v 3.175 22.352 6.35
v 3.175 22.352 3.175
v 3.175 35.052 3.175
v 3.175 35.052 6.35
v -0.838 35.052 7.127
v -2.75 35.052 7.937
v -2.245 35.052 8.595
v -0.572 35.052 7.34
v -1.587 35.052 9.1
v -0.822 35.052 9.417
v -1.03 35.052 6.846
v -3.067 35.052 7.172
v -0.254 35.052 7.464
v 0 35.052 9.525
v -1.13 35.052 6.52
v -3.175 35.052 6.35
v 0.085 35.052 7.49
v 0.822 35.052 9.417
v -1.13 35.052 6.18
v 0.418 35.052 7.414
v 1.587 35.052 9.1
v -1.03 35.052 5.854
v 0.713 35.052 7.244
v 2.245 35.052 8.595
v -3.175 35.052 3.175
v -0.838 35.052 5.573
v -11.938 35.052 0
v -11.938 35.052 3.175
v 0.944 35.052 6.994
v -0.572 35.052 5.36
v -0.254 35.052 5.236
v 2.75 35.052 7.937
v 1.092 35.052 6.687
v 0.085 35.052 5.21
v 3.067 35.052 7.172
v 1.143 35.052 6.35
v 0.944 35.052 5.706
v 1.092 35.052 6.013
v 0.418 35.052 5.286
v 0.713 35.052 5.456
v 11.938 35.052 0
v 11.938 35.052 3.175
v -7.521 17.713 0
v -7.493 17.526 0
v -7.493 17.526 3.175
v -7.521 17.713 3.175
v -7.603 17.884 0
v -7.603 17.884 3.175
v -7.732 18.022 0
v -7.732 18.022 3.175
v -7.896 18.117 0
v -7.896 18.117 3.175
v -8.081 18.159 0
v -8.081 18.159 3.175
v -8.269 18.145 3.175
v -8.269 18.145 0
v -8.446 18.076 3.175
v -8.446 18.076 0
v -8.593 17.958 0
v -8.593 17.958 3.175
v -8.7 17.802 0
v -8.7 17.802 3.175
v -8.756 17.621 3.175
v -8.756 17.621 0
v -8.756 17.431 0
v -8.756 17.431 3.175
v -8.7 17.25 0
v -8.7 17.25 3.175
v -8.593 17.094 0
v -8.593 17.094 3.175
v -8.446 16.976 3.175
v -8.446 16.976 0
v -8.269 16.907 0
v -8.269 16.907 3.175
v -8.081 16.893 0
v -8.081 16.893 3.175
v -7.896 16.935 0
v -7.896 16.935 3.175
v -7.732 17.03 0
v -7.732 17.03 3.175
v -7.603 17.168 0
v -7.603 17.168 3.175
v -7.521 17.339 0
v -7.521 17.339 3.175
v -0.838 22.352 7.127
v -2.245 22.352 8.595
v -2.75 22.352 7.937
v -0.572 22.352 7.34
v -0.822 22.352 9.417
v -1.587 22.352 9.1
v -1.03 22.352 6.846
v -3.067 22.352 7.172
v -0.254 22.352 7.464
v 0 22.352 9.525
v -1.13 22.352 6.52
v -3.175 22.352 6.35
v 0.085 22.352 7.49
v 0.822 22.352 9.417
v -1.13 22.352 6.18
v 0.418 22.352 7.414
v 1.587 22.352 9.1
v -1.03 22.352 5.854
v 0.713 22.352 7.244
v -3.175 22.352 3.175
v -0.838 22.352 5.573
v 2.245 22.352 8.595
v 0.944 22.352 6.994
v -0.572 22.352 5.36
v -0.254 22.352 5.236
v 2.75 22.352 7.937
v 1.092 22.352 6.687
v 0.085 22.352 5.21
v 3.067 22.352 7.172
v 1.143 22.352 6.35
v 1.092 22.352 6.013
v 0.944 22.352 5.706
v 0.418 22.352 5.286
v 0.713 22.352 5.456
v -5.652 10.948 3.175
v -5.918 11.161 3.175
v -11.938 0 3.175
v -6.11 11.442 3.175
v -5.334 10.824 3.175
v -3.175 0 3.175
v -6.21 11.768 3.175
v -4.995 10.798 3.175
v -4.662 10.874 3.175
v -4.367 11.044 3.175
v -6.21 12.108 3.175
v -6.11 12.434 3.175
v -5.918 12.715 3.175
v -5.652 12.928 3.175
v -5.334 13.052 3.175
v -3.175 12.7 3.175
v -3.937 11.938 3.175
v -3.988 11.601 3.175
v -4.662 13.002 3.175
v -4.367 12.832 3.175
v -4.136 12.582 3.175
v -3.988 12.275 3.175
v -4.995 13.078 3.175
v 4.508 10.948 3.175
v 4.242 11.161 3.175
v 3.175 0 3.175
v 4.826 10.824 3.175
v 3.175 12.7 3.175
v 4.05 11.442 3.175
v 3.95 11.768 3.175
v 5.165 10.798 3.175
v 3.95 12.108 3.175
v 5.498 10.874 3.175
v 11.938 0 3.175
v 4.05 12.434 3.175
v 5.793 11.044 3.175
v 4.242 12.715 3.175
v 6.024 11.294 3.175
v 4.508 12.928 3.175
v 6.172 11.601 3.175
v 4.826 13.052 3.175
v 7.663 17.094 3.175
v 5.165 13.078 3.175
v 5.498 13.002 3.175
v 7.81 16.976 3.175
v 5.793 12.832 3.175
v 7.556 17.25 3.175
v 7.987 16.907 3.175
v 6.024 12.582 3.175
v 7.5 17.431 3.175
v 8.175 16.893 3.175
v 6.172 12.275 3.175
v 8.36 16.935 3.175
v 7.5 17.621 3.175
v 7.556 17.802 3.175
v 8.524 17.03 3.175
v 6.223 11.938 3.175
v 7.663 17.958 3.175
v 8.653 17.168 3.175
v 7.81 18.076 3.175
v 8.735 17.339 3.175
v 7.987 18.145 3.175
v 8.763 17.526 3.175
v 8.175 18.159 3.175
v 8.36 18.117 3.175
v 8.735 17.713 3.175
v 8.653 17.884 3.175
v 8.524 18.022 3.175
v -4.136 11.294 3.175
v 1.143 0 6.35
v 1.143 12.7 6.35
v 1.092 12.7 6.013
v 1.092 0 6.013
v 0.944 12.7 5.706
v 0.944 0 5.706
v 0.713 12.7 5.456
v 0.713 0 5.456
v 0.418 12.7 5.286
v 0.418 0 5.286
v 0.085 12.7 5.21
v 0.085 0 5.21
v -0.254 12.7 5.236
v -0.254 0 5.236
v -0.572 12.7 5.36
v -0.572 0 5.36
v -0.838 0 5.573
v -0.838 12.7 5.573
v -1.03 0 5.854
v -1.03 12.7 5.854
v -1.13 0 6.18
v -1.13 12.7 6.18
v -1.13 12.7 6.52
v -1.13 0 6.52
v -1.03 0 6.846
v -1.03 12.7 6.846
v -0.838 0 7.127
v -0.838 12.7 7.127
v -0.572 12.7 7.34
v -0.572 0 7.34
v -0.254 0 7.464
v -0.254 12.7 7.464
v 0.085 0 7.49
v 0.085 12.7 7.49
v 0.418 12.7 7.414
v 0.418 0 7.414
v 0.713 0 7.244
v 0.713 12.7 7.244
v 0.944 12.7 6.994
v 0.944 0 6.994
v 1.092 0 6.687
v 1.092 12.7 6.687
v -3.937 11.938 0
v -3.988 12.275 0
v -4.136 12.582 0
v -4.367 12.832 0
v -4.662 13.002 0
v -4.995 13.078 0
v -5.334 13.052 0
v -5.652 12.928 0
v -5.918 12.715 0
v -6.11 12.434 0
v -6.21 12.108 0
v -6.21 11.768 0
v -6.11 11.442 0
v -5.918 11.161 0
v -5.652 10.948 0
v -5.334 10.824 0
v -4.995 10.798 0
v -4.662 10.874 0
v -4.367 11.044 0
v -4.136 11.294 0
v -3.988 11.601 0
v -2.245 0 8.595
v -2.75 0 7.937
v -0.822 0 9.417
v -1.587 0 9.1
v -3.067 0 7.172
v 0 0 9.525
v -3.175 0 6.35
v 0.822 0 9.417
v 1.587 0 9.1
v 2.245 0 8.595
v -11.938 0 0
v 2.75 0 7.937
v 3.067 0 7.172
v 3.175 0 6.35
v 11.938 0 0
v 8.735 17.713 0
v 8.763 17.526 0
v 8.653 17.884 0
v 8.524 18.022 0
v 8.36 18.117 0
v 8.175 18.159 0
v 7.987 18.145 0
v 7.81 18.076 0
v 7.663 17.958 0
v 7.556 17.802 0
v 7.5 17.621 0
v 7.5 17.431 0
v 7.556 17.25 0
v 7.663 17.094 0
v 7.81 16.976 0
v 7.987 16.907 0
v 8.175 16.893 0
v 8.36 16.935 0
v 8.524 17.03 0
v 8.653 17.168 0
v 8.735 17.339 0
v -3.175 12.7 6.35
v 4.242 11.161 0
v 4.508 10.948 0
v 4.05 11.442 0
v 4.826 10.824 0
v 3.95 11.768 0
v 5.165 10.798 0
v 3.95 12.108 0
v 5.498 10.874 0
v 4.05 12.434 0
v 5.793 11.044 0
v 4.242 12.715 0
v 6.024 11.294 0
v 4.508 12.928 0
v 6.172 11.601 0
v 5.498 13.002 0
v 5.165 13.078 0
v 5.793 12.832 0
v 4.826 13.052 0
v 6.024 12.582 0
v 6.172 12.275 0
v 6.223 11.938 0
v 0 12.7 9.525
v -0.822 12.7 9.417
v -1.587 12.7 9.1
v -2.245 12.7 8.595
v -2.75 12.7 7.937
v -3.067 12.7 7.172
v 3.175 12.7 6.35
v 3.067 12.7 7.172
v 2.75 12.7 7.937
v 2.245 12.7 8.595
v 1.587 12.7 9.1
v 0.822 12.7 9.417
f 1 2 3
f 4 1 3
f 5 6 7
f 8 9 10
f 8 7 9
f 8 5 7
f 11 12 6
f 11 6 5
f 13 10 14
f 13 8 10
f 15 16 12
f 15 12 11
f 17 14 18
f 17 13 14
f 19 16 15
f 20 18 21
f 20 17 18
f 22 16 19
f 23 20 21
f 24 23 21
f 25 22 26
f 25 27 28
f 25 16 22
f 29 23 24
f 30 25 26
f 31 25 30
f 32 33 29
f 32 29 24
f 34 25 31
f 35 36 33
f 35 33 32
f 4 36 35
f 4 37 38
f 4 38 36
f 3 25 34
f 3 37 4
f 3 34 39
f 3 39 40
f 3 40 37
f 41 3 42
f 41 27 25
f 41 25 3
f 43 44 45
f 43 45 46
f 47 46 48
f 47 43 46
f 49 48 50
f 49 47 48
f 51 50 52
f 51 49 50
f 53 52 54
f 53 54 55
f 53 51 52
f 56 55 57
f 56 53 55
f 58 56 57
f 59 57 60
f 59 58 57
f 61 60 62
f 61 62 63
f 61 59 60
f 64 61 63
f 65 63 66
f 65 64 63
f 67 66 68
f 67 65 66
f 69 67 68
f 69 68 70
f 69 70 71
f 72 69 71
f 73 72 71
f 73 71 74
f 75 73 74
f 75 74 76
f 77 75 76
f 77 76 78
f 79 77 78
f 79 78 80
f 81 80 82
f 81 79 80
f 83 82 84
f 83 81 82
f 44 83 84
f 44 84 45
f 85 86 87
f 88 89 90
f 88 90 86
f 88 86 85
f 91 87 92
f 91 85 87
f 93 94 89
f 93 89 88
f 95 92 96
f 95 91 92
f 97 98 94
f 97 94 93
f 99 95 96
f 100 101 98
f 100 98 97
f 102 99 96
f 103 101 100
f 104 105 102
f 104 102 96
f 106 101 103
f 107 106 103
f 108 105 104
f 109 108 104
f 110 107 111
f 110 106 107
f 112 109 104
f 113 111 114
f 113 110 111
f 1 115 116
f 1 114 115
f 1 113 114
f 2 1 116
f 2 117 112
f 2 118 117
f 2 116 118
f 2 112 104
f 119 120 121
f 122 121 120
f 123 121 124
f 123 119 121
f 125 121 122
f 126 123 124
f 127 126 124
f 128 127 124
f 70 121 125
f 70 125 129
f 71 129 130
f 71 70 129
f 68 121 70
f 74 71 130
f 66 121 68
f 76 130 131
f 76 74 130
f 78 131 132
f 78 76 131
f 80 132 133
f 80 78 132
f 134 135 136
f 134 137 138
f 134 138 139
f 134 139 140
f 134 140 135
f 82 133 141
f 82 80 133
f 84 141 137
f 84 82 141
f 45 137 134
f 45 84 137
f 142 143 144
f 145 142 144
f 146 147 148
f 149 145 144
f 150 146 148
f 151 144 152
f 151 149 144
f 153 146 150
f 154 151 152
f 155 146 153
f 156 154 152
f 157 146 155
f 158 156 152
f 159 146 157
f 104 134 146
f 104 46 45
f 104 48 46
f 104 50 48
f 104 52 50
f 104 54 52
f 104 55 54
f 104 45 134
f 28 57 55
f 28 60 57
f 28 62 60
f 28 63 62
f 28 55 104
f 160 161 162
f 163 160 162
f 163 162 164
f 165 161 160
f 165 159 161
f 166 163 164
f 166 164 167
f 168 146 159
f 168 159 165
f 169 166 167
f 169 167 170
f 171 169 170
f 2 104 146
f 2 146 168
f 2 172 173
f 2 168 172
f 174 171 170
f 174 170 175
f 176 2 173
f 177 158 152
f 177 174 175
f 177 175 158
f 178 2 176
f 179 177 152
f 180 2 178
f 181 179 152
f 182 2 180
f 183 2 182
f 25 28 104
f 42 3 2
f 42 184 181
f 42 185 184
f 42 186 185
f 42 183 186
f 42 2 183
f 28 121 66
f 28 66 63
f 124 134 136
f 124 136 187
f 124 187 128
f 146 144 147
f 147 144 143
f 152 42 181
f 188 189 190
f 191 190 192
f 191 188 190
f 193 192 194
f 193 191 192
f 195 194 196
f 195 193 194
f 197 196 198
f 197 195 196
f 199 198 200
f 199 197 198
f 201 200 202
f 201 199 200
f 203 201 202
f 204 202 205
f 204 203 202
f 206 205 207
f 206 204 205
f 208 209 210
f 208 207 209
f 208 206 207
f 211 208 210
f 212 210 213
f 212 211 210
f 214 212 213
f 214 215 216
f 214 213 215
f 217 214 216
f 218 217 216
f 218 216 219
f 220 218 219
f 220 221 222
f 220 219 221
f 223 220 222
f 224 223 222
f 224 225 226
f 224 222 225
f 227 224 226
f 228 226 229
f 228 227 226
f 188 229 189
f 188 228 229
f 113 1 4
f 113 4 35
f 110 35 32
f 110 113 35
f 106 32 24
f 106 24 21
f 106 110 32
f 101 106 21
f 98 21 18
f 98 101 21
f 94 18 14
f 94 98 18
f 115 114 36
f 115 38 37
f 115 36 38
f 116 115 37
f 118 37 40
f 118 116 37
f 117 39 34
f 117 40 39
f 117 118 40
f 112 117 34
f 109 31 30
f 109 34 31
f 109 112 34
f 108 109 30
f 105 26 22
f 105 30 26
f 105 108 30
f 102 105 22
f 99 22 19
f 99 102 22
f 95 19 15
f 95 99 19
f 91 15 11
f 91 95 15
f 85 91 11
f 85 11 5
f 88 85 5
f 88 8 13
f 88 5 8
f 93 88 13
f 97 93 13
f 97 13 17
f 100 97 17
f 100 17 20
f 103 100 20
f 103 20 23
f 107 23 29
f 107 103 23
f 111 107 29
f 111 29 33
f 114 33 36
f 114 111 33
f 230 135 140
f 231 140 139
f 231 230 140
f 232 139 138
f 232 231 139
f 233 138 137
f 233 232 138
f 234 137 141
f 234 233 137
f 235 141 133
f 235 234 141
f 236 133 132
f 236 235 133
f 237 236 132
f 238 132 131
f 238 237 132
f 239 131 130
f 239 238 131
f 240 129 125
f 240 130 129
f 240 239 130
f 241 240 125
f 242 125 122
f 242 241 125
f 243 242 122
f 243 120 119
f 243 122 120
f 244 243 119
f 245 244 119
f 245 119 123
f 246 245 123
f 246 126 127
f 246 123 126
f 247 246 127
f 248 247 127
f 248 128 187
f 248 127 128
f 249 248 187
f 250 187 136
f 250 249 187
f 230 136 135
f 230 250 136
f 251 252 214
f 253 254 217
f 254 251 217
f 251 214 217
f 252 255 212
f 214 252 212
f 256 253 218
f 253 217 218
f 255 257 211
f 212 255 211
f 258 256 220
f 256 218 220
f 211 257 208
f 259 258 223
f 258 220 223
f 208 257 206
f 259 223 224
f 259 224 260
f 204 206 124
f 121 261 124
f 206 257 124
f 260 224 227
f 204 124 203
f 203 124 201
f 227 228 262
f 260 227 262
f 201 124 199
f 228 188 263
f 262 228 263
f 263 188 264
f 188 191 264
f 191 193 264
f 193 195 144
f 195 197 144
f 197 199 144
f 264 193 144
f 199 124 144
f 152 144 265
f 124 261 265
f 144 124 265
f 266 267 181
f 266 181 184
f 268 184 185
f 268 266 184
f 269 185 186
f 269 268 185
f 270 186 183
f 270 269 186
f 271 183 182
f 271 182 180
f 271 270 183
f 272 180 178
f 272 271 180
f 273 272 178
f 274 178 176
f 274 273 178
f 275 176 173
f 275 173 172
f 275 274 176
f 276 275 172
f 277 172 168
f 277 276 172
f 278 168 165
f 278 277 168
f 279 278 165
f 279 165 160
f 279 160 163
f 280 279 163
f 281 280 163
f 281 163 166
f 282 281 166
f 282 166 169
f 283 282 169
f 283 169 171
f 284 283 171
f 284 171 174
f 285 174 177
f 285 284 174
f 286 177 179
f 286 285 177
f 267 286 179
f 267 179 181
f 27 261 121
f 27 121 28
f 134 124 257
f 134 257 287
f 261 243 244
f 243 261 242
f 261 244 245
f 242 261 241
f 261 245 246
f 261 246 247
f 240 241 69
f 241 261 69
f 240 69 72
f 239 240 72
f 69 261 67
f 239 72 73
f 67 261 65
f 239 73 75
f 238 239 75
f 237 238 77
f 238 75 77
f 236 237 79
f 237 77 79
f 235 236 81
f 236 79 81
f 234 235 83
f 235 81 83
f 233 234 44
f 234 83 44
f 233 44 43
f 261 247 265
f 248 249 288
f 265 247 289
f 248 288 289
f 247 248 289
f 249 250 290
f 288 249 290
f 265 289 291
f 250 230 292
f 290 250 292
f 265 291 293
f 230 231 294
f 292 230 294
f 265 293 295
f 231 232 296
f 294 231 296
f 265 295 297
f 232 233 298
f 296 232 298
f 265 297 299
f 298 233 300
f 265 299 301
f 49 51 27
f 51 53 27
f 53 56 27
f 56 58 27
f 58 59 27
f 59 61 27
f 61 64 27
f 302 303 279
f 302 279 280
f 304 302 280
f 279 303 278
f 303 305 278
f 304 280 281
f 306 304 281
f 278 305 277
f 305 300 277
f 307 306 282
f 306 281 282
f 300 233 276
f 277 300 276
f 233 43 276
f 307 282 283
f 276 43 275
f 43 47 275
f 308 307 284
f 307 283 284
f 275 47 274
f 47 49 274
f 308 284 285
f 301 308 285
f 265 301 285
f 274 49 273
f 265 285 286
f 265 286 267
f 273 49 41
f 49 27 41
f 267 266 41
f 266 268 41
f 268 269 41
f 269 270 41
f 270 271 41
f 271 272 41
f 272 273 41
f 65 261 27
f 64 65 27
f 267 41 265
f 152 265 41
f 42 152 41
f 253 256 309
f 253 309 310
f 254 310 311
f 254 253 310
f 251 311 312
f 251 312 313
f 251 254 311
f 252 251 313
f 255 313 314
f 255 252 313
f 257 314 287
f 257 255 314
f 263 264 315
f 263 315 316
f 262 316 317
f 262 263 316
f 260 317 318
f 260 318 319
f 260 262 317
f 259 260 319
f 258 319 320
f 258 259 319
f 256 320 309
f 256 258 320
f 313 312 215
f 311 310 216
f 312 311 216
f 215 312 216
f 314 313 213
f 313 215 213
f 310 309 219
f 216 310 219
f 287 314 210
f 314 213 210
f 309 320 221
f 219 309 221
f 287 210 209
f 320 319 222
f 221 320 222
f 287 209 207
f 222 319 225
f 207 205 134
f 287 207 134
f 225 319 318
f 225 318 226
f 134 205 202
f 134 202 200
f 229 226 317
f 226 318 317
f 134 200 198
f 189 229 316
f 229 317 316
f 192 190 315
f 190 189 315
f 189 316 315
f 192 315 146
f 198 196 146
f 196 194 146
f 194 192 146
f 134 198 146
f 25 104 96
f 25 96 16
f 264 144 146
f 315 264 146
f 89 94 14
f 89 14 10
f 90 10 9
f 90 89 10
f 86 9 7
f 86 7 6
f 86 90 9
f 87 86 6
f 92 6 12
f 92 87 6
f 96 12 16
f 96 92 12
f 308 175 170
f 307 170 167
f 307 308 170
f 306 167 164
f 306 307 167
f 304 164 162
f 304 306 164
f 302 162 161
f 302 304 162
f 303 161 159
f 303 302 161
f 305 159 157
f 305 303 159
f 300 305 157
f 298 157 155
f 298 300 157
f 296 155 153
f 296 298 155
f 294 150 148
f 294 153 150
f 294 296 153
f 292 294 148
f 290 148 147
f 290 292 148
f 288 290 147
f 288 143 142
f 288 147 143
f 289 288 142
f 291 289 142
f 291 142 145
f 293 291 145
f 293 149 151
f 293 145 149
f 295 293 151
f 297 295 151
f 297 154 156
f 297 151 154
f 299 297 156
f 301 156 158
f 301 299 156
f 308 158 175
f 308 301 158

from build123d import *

# Parameters (mm, degrees)
SKETCH2_W           = 23.876
SKETCH2_H           = 35.052
SKETCH2_R           = 1.143
SKETCH2_R_2         = 0.635
BOSS_EXTRUDE1_DEPTH = 3.175
SKETCH3_W           = 6.35
SKETCH3_H           = 35.052
BOSS_EXTRUDE2_DEPTH = 6.35
SKETCH4_R           = 1.143
CUT_EXTRUDE3_DEPTH  = 49.53
SKETCH5_W           = 6.35
SKETCH5_H           = 9.652
CUT_EXTRUDE4_DEPTH  = 24.765
CUT_EXTRUDE5_DEPTH  = 49.53


with BuildPart() as part:
    # Sketch2 → Boss-Extrude1 (new body)
    with BuildSketch(Plane.XY):
        with Locations((0, 17.526)):
            Rectangle(SKETCH2_W, SKETCH2_H)
        with Locations((-5.08, 11.938)):
            Circle(SKETCH2_R, mode=Mode.SUBTRACT)
        with Locations((5.08, 11.938)):
            Circle(SKETCH2_R, mode=Mode.SUBTRACT)
        with Locations((-8.128, 17.526)):
            Circle(SKETCH2_R_2, mode=Mode.SUBTRACT)
        with Locations((8.128, 17.526)):
            Circle(SKETCH2_R_2, mode=Mode.SUBTRACT)
    extrude(amount=BOSS_EXTRUDE1_DEPTH)

    # Sketch3 → Boss-Extrude2 (add)
    with BuildSketch(Plane.XY.offset(3.175)):
        with Locations((0, 17.526)):
            Rectangle(SKETCH3_W, SKETCH3_H)
    extrude(amount=BOSS_EXTRUDE2_DEPTH)

    # Sketch4 → Cut-Extrude3 (cut)
    with BuildSketch(Plane(origin=(0, 0, 0), x_dir=(1, 0, 0), z_dir=(0, 1, 0))):
        with Locations((0, -6.35)):
            Circle(SKETCH4_R)
    extrude(amount=CUT_EXTRUDE3_DEPTH, mode=Mode.SUBTRACT)

    # Sketch5 → Cut-Extrude4 (cut, symmetric)
    with BuildSketch(Plane(origin=(0, 0, 0), x_dir=(0, 0, -1), z_dir=(1, 0, 0))):
        with Locations((-6.35, 17.526)):
            Rectangle(SKETCH5_W, SKETCH5_H)
    extrude(amount=CUT_EXTRUDE4_DEPTH, both=True, mode=Mode.SUBTRACT)

    # Sketch6 → Cut-Extrude5 (cut)
    with BuildSketch(Plane(origin=(0, 0, 0), x_dir=(1, 0, 0), z_dir=(0, 1, 0))):
        with BuildLine():
            ThreePointArc((0, -9.525), (-2.24506403, -8.59506403), (-3.175, -6.35))
            Line((-3.175, -6.35), (-3.175, -9.525))
            Line((-3.175, -9.525), (0, -9.525))
        make_face()
        with BuildLine():
            ThreePointArc((3.175, -6.35), (2.24506403, -8.59506403), (0, -9.525))
            Line((0, -9.525), (3.175, -9.525))
            Line((3.175, -9.525), (3.175, -6.35))
        make_face()
    extrude(amount=CUT_EXTRUDE5_DEPTH, mode=Mode.SUBTRACT)


solid = part.part
